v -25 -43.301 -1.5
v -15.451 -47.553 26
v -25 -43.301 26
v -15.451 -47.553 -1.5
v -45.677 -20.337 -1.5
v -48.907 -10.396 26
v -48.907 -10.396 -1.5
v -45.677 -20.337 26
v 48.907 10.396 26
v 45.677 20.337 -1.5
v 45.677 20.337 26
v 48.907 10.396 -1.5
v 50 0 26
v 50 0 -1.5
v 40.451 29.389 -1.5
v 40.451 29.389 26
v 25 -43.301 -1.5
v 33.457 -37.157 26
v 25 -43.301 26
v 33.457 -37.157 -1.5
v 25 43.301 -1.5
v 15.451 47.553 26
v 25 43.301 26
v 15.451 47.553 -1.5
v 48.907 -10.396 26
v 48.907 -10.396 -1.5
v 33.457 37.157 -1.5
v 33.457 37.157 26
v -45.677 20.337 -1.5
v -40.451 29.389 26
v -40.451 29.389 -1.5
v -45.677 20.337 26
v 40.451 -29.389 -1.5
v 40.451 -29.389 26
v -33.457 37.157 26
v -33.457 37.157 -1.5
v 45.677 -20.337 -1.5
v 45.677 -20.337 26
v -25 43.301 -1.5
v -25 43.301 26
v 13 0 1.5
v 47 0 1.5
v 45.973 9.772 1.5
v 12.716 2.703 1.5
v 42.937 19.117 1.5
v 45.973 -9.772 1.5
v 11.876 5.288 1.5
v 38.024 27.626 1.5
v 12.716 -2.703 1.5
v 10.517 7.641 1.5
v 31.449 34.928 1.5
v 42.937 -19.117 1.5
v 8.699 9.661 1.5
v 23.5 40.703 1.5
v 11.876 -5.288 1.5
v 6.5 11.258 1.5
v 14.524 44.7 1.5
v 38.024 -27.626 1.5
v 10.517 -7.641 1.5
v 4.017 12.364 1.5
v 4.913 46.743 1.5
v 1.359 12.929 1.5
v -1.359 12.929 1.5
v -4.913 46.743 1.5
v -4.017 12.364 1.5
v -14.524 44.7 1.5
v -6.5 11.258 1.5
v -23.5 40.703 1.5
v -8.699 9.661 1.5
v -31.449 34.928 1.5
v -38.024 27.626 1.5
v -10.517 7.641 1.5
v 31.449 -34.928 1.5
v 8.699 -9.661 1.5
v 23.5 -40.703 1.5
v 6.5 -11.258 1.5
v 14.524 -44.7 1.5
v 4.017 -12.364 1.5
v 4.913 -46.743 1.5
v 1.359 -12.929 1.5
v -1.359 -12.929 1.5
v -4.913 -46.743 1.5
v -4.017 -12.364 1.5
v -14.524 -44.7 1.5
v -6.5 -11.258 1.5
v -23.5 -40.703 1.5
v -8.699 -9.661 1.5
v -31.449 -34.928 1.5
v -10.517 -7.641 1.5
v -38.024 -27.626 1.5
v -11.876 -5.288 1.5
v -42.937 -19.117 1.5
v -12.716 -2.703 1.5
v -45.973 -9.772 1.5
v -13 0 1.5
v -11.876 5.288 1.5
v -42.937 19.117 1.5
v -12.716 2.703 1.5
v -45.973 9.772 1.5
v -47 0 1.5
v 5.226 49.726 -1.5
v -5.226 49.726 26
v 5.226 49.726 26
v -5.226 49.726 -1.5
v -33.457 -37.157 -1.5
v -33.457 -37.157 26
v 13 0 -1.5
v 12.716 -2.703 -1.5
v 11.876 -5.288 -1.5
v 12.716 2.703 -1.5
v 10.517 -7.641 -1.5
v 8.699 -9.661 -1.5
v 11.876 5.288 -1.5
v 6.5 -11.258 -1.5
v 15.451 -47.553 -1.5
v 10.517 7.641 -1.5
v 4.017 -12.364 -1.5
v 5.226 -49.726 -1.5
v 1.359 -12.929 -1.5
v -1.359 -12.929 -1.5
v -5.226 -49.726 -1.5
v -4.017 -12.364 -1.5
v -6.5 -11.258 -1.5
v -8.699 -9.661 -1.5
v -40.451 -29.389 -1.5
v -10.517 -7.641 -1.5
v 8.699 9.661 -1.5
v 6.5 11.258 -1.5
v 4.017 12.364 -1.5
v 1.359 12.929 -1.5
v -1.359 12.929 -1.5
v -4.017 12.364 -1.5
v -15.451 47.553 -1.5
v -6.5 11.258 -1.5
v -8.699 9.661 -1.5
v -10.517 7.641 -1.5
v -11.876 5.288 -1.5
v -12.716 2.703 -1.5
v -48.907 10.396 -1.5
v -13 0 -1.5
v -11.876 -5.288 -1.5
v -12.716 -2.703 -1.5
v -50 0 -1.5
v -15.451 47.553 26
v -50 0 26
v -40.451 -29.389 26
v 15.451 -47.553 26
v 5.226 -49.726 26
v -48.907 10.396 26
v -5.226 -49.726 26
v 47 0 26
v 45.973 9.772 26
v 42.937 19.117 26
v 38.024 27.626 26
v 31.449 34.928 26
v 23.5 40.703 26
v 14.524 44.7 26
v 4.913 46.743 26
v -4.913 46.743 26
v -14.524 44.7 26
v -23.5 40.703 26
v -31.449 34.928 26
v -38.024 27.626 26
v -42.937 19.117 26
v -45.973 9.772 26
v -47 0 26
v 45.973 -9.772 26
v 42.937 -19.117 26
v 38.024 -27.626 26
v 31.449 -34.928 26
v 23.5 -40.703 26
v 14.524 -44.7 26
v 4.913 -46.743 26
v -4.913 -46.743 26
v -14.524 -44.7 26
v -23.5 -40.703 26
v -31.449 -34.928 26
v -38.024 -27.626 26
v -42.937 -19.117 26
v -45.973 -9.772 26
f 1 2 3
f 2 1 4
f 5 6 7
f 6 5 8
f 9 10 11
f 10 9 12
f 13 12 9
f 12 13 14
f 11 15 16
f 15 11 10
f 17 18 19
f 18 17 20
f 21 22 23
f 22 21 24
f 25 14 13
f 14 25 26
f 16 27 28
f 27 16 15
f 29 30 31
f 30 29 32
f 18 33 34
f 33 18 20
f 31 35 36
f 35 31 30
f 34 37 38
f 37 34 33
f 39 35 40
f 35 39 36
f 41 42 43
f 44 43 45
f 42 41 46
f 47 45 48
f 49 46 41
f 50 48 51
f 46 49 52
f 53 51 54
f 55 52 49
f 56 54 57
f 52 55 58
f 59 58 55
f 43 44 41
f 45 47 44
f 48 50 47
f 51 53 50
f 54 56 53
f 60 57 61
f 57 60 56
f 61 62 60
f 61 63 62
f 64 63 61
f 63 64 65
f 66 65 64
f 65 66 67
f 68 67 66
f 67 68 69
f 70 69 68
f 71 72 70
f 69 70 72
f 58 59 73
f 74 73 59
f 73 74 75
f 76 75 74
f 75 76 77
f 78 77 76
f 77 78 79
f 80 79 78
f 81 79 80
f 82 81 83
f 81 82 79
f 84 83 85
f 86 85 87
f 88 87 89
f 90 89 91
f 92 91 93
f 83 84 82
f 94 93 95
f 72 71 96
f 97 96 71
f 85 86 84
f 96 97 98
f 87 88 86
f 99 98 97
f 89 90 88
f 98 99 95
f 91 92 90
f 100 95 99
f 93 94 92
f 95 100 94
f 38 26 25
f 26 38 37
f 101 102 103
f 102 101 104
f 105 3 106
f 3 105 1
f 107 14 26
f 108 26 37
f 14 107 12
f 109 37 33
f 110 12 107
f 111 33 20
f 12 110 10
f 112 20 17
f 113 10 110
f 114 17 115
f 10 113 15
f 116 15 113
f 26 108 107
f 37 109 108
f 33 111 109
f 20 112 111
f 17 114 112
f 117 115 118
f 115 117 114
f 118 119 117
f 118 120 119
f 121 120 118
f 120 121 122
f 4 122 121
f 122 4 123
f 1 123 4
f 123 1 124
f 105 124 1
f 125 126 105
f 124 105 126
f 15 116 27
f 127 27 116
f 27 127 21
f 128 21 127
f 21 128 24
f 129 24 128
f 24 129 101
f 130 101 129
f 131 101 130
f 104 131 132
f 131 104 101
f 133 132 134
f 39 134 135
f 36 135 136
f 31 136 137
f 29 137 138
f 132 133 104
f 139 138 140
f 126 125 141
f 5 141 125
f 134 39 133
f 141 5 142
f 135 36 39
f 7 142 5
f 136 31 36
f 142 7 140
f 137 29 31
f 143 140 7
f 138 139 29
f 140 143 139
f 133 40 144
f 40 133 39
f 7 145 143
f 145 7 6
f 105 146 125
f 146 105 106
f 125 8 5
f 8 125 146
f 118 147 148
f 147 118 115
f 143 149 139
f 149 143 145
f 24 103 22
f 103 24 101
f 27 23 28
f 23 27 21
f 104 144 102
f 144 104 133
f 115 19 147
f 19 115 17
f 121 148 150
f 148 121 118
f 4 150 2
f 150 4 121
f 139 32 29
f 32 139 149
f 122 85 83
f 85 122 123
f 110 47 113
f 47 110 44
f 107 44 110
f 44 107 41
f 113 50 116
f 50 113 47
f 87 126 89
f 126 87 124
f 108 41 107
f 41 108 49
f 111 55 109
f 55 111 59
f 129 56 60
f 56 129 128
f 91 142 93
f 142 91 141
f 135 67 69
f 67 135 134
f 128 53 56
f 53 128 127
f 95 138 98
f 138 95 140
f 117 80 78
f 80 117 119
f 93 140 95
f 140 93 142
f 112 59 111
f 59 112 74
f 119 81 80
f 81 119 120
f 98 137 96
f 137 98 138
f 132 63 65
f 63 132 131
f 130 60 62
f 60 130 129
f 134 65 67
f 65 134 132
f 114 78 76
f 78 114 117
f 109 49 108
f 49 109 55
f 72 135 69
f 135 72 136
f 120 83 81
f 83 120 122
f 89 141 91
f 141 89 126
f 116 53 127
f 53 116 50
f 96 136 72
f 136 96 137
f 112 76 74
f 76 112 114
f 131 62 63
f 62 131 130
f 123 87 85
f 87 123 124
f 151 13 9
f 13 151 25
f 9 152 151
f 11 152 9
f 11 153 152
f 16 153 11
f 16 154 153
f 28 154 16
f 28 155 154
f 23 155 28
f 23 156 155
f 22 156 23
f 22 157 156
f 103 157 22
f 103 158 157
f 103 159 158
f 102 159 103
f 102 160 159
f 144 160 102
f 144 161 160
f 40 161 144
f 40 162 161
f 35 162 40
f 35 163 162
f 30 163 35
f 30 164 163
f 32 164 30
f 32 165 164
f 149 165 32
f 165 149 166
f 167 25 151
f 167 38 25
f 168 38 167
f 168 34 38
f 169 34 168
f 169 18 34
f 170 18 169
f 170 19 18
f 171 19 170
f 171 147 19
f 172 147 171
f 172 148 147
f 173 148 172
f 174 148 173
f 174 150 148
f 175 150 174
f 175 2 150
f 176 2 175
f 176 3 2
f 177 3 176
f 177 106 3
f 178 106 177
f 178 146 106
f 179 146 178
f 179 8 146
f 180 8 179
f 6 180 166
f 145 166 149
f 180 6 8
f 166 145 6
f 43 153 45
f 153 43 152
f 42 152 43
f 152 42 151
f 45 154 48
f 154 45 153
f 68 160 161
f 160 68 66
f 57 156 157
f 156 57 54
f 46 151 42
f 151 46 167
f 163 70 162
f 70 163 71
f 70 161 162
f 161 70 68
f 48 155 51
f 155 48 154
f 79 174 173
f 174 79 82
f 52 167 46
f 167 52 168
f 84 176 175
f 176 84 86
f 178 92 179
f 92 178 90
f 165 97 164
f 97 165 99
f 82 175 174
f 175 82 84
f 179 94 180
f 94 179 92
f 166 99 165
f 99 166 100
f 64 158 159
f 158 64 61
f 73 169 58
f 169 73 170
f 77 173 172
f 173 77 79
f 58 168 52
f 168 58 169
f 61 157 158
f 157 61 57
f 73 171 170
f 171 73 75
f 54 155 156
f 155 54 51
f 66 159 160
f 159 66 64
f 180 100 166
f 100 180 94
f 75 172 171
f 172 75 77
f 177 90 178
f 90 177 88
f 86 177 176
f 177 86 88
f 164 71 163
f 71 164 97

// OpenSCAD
// felso perem
/*
translate([0,0,1.5])
difference() {
    cylinder(r=52, h=3, center=true); 
    cylinder(r=50, h=3, center=true);
}
*/
// also dekli
translate([0,0,0])
    difference() {
        cylinder(r=50, h=3, center=true);
        cylinder(r=13, h=3, center=true);
    } 

// cso
translate([0,0,13]) {
    difference() {
        cylinder(r=50, h=26, center=true);
        cylinder(r=47, h=26, center=true);    
    }
   }
